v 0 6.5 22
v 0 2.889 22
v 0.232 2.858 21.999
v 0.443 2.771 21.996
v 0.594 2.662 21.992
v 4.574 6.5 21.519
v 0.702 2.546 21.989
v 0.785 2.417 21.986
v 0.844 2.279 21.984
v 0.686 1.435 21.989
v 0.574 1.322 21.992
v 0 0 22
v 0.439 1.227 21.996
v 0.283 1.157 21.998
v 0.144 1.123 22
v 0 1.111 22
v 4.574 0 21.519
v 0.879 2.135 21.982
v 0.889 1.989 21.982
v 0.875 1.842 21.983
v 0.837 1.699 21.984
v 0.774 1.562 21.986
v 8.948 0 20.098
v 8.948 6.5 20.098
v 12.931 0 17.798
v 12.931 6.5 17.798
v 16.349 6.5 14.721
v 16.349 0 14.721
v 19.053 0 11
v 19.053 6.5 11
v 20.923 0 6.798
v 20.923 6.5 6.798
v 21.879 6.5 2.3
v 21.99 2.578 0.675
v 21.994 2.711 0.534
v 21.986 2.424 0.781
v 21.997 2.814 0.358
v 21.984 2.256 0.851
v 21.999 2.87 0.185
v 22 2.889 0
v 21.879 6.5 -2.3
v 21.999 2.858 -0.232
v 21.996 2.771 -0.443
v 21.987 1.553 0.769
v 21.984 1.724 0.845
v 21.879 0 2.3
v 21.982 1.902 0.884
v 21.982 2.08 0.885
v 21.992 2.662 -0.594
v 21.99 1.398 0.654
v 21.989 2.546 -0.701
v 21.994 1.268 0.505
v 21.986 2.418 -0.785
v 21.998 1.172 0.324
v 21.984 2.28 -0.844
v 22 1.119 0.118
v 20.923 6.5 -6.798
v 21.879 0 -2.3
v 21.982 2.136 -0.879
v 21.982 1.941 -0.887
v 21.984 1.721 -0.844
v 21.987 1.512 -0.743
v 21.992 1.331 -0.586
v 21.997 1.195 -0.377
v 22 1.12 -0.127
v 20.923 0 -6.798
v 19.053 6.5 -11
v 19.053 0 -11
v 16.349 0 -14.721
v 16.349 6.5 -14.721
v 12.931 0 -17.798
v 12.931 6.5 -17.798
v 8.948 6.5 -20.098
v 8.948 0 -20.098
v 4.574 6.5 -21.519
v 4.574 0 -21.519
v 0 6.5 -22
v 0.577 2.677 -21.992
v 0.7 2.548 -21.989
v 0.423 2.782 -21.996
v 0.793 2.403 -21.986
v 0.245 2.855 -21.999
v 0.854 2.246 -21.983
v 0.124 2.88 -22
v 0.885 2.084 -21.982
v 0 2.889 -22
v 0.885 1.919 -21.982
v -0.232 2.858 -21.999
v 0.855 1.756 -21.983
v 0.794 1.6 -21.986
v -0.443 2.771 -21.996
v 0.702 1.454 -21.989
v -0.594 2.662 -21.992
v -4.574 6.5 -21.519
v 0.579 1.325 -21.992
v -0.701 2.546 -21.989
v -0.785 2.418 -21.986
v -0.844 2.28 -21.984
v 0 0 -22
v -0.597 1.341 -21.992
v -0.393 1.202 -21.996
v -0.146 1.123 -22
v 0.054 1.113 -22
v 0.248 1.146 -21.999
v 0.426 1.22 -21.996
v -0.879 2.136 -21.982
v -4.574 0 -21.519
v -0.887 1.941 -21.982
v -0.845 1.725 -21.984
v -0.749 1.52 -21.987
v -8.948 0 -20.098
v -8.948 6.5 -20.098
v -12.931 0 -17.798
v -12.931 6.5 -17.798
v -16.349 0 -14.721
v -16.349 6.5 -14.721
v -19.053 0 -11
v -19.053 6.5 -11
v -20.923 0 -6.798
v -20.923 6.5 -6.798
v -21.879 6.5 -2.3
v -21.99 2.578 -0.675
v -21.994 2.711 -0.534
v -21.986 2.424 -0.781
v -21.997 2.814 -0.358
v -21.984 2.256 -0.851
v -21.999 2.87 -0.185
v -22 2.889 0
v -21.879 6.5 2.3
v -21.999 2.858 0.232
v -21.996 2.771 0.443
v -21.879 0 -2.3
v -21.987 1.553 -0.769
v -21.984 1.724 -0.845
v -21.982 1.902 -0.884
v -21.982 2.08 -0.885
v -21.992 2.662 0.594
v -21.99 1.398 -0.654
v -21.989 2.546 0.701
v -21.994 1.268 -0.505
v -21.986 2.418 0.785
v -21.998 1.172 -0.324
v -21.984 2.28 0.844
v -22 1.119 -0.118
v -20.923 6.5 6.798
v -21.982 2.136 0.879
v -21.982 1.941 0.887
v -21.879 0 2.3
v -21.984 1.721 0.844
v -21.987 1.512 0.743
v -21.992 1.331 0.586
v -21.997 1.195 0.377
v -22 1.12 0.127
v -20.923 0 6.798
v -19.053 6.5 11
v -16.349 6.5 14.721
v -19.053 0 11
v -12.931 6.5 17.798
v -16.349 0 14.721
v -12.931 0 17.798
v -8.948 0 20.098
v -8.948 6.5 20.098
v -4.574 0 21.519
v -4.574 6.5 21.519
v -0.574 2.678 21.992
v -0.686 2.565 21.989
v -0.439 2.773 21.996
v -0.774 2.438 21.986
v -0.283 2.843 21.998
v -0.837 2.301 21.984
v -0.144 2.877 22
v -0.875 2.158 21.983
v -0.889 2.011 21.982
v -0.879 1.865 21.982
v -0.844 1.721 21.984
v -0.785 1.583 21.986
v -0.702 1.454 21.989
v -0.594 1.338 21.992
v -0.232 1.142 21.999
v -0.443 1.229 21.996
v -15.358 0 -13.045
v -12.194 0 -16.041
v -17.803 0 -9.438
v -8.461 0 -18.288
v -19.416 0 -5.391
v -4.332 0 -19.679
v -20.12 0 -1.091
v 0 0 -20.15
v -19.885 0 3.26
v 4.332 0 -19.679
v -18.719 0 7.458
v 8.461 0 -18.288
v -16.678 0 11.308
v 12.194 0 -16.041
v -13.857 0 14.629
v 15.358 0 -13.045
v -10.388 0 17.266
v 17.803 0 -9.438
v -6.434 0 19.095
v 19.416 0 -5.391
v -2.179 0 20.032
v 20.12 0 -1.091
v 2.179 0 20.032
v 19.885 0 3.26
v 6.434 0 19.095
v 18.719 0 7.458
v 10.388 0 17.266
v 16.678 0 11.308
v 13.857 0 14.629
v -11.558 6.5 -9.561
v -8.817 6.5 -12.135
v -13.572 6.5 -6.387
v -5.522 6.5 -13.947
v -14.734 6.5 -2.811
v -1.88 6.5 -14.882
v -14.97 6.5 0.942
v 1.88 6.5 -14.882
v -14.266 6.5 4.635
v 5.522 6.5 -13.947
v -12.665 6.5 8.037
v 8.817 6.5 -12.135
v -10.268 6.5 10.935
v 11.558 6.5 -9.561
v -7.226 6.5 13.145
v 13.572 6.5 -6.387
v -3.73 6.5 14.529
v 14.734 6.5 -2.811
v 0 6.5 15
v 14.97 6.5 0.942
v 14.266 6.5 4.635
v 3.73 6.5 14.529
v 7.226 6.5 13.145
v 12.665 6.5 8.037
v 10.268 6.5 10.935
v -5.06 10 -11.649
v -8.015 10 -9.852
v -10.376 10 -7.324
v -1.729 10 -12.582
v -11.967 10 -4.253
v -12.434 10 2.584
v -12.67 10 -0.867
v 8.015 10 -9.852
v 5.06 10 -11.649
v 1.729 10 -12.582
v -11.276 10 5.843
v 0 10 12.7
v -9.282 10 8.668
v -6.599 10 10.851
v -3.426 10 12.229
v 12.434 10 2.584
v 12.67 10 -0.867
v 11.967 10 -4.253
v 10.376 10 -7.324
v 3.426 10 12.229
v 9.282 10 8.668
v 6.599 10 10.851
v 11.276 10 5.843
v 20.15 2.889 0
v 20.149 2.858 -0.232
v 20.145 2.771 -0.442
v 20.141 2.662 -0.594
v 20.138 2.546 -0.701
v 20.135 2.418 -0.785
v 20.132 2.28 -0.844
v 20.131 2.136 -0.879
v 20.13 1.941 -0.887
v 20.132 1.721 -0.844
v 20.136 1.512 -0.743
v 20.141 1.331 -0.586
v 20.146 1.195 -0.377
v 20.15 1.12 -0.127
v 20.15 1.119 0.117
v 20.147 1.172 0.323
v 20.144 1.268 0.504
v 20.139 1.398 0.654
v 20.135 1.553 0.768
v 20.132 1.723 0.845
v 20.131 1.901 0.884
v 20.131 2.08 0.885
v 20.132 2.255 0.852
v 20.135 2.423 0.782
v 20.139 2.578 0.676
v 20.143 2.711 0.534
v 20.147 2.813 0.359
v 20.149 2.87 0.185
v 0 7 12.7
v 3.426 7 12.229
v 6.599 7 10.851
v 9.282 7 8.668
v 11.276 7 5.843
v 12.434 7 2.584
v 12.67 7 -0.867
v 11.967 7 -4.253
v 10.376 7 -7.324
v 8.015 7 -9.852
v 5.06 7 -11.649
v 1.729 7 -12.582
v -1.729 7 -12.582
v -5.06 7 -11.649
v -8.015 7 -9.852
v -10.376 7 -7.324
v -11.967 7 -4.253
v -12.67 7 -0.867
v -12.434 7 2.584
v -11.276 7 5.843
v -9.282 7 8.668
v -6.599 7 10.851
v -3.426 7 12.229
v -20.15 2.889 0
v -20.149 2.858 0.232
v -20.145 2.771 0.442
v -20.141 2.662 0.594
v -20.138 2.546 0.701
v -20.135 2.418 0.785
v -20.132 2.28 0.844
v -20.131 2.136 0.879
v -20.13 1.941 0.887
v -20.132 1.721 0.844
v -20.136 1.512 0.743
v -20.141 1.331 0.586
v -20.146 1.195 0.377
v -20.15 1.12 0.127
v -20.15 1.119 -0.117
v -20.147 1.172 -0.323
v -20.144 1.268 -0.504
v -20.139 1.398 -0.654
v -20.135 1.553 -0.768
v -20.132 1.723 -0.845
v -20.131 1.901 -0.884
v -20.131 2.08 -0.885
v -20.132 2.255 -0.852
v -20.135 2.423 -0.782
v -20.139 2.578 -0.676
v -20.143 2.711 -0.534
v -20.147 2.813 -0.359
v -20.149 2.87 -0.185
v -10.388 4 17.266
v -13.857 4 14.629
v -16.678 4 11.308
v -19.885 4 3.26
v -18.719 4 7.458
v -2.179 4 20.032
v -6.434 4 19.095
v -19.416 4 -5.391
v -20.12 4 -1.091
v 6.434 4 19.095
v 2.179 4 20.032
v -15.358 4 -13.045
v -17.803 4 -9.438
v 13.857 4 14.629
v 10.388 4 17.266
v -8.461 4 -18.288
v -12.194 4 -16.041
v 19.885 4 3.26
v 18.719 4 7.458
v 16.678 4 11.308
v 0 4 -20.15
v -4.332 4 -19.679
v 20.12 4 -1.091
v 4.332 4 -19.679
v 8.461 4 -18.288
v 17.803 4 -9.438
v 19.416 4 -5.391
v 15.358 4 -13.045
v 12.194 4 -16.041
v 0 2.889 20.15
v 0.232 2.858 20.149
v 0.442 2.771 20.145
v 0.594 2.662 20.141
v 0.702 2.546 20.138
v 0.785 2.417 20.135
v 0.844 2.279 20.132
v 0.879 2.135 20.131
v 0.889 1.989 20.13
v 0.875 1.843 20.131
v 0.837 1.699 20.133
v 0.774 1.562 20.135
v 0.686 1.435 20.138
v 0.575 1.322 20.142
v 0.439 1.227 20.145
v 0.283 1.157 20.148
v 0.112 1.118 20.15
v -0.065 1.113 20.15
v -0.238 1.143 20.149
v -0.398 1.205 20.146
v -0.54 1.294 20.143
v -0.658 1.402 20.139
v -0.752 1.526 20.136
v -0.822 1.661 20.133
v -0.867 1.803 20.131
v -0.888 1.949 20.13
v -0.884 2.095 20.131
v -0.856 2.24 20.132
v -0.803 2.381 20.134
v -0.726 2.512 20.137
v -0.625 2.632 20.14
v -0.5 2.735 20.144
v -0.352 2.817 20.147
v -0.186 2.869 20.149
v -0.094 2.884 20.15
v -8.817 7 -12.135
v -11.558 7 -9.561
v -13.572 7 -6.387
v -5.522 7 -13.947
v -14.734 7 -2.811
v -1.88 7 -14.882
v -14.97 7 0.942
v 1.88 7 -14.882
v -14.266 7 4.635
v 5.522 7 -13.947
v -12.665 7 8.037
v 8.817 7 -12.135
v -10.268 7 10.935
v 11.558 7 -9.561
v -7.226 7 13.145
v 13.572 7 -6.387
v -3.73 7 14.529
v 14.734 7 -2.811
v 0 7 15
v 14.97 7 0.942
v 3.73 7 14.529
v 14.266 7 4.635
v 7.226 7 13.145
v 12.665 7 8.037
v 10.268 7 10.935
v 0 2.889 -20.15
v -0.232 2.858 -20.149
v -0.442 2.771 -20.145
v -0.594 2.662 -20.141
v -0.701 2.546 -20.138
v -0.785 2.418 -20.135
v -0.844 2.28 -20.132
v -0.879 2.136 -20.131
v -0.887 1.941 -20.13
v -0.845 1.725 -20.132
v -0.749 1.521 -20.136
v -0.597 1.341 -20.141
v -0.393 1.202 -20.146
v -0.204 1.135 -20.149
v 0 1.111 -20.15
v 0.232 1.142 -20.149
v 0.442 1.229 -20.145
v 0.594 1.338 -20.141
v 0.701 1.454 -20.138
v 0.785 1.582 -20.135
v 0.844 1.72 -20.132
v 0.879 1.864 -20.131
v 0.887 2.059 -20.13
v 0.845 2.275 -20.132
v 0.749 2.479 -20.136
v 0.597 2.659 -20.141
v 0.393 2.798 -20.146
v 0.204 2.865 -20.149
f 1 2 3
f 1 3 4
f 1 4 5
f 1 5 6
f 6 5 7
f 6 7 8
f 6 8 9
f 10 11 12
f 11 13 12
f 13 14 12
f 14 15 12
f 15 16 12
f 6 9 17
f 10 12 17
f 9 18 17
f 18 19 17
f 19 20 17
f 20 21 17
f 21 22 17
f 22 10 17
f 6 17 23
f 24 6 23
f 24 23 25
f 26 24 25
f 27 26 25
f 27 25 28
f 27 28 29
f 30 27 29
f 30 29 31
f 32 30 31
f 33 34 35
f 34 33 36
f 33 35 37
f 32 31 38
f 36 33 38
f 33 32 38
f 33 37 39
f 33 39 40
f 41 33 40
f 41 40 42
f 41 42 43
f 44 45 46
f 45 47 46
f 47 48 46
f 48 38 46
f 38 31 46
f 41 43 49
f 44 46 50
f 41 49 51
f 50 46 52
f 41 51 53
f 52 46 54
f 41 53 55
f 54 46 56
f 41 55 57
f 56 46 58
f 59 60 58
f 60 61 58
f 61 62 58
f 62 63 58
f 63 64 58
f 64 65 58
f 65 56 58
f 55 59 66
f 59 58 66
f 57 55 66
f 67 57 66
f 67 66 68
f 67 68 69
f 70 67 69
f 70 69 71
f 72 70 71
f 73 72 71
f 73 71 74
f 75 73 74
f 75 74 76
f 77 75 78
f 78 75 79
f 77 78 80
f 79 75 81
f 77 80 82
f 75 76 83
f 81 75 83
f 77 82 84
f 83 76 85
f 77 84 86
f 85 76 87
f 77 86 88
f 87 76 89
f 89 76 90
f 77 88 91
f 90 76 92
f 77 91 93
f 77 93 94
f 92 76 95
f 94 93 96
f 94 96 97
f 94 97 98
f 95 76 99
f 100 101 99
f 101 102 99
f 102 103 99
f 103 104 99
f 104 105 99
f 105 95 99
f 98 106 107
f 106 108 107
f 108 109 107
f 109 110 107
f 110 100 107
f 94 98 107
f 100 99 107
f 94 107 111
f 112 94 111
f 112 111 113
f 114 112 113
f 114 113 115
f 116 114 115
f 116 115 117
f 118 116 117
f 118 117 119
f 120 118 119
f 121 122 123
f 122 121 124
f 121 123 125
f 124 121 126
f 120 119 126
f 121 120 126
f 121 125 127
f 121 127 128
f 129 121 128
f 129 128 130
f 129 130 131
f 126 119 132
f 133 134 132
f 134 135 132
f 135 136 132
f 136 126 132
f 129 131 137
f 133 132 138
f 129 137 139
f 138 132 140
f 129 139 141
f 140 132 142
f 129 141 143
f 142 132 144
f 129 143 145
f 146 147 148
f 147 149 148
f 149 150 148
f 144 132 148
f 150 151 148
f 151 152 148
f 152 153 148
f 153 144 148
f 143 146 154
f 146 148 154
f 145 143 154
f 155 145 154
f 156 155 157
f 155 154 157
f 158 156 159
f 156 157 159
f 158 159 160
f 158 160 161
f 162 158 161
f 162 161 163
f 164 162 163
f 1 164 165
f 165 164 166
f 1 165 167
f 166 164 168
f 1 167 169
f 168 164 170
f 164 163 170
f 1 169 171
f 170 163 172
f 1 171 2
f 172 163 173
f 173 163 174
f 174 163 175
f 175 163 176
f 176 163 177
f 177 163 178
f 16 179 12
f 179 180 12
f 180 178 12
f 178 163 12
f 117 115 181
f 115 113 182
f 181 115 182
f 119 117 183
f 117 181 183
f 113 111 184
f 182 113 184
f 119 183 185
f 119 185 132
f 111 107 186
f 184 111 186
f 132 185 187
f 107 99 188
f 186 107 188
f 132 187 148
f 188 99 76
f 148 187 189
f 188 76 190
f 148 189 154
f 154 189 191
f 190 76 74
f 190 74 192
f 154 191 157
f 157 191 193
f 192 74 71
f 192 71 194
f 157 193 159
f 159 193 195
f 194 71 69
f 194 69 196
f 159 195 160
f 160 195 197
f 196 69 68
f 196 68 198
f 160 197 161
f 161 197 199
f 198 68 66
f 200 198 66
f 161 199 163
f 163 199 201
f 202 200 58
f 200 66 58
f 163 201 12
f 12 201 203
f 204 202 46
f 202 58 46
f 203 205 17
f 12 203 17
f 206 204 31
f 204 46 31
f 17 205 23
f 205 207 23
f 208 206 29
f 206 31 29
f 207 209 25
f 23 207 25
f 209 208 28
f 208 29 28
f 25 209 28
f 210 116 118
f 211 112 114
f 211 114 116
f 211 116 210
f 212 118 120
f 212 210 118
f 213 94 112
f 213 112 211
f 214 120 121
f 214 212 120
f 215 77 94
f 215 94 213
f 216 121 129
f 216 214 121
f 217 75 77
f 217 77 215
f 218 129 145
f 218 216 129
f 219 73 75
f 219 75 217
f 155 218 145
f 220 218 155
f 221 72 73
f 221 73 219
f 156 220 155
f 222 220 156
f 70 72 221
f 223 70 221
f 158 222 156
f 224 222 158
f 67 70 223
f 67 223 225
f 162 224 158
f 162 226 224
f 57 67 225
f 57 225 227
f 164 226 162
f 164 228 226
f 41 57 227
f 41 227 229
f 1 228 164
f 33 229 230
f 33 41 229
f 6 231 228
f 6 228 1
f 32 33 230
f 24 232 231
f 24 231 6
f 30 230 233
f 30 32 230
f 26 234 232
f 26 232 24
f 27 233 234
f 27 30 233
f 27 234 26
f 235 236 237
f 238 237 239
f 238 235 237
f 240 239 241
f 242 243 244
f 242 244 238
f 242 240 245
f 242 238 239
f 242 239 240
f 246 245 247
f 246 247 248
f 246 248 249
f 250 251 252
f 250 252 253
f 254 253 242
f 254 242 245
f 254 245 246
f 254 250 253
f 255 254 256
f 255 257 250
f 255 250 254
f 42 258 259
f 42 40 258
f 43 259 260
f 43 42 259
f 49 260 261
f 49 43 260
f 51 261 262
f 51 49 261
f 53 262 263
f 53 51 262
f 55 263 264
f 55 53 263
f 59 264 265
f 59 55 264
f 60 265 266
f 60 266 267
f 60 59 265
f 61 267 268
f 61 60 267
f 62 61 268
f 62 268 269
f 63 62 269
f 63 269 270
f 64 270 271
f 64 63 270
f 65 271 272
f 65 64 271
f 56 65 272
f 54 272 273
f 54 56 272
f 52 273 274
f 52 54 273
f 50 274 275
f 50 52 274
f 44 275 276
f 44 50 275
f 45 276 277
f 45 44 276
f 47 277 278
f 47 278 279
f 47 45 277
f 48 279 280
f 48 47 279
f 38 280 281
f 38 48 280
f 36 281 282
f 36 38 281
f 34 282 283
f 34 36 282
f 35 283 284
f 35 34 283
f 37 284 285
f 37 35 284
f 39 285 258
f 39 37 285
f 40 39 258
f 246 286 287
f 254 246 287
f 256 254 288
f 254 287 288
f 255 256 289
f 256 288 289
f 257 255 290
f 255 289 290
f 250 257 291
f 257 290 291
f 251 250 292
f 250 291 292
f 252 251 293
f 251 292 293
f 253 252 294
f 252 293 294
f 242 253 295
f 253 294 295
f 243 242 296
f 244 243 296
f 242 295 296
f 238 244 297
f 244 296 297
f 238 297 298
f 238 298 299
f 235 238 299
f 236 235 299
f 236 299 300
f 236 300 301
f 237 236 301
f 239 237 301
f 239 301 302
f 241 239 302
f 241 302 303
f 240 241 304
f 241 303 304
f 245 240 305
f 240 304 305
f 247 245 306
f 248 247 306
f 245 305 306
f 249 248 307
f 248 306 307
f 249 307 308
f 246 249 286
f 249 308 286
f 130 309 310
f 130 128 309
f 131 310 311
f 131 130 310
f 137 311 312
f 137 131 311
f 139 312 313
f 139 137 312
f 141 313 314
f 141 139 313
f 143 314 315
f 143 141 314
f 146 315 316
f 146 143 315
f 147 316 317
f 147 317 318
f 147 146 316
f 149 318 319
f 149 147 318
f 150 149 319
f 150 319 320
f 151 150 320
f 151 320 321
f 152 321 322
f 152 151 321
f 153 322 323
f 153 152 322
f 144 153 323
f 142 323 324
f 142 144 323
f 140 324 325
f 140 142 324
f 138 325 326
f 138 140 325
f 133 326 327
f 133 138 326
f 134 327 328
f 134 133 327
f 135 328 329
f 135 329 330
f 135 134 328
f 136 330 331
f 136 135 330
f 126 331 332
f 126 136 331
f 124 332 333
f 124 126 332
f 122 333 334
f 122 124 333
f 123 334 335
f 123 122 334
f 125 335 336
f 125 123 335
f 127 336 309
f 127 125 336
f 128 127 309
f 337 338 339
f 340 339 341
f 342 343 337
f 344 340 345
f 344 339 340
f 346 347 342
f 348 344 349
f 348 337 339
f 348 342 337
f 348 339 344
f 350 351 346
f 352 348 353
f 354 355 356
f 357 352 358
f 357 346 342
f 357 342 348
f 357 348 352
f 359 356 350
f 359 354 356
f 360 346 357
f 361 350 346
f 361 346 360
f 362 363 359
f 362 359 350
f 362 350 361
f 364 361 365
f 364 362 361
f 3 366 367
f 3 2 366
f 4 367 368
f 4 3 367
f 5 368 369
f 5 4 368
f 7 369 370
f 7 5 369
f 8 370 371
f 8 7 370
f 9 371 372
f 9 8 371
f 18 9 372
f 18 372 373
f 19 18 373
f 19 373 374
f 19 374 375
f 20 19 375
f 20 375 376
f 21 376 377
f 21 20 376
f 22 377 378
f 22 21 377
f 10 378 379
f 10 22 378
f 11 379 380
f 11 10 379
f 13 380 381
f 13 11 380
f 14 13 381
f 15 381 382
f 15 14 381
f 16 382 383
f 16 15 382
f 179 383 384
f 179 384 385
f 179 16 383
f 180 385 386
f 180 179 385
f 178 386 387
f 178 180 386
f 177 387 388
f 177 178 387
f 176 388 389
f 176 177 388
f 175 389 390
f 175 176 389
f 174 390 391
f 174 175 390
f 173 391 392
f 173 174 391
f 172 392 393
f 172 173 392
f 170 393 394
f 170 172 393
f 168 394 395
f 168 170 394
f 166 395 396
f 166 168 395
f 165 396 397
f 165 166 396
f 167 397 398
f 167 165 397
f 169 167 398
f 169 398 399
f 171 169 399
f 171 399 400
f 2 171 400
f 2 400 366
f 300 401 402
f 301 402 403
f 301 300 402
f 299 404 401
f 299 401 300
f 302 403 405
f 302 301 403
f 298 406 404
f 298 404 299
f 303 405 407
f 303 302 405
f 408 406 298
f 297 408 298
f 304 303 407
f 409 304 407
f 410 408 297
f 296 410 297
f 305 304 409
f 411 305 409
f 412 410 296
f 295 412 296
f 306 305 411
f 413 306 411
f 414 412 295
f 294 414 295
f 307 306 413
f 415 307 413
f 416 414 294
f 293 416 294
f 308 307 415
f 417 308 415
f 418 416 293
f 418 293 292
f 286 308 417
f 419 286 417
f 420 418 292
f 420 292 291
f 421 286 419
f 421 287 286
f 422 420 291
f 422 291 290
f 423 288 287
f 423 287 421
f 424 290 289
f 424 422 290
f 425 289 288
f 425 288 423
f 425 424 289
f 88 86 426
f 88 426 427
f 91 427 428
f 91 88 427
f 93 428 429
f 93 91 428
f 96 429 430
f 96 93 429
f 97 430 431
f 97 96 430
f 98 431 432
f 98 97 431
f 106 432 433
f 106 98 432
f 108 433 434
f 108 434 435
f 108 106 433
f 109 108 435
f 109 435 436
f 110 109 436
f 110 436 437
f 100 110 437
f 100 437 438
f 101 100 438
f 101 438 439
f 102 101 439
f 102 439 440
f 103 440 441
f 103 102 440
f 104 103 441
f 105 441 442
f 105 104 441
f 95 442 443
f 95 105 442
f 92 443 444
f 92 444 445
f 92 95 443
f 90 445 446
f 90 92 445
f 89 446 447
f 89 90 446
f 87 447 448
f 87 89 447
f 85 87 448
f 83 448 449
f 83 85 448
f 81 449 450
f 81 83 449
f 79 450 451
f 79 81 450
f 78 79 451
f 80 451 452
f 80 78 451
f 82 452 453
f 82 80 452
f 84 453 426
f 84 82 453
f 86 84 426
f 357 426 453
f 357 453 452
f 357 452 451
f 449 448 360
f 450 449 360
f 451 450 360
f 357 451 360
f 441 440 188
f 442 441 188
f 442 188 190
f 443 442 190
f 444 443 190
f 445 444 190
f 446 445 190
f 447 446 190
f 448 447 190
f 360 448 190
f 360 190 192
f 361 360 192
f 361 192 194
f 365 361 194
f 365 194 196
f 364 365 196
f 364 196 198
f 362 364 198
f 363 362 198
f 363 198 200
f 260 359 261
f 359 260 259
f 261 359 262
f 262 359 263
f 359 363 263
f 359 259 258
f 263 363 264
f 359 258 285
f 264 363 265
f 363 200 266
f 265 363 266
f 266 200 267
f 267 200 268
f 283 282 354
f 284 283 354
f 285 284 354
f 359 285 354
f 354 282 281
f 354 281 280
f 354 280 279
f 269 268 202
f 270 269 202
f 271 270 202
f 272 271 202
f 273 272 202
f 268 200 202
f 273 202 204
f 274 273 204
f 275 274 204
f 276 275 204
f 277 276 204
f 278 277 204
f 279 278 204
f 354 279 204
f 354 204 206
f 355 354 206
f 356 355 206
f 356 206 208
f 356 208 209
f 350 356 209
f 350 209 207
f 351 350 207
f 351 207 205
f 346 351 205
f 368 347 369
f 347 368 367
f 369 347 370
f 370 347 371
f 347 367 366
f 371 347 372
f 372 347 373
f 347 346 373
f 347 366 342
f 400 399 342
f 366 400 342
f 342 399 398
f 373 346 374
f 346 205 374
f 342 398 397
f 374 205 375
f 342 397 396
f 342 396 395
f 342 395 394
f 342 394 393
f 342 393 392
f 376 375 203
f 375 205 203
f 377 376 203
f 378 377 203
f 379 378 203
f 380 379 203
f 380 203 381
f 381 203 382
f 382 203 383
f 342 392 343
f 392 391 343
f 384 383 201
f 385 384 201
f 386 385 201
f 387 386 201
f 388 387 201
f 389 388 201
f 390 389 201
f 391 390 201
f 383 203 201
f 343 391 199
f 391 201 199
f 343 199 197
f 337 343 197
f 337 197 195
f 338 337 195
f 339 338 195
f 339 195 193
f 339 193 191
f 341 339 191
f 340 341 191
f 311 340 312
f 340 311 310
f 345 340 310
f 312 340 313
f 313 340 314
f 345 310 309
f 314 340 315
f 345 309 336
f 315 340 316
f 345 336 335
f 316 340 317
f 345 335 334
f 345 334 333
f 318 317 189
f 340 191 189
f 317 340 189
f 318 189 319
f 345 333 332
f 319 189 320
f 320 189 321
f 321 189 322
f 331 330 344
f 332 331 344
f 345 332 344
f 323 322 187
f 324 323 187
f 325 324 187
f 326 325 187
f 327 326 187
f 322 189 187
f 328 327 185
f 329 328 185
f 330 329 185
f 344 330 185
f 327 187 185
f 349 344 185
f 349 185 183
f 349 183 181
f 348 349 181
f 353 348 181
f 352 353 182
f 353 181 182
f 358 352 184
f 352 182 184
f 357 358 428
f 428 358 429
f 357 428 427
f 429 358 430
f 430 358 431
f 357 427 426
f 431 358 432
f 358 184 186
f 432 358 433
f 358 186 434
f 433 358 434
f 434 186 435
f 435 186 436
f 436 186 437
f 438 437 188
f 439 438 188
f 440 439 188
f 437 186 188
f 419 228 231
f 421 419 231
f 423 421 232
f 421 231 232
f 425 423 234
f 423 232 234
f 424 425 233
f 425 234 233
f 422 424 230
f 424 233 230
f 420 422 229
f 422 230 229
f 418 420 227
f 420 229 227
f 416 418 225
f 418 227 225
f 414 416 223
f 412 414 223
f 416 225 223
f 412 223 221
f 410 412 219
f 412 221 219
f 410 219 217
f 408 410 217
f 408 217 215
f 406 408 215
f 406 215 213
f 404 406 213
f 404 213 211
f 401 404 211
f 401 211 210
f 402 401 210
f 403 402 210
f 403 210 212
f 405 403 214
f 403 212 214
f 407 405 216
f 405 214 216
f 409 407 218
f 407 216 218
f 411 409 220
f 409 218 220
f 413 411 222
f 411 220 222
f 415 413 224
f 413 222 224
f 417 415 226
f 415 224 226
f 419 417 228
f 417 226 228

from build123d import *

# Parameters (mm, degrees)
SKETCH_2_R               = 22
EXTRUDE_1_DEPTH          = 10
SKETCH_3_R               = 20
CUT_EXTRUDE_1_DEPTH      = 4
CUT_EXTRUDE_START        = -3
SKETCH_4_R               = 22
SKETCH_4_R_2             = 12.7
CUT_EXTRUDE_2_DEPTH      = 3
SKETCH_9_R               = 20.15
CUT_EXTRUDE_3_DEPTH      = 4
CUT_EXTRUDE_START_2      = -0.5
SKETCH_10_R              = 22
SKETCH_10_R_2            = 15
CUT_EXTRUDE_4_DEPTH      = 0.5
PATTERN_CIRCULAR_1_COUNT = 4


with BuildPart() as part:
    # 草图2 → 凸台-拉伸1 (new body)
    with BuildSketch(Plane(origin=(0, 0, 0), x_dir=(1, 0, 0), z_dir=(0, 1, 0))):
        with Locations(Location((0, 0, 0), (0, 0, 270))):
            Circle(SKETCH_2_R)
    extrude(amount=EXTRUDE_1_DEPTH)

    # 草图3 → 切除-拉伸1 (cut)
    with BuildSketch(Plane.XZ):
        with Locations(Location((0, 0, 0), (0, 0, 270))):
            Circle(SKETCH_3_R)
    extrude(amount=-CUT_EXTRUDE_1_DEPTH, mode=Mode.SUBTRACT)

    # 草图4 → 切除-拉伸2 (cut)
    with BuildSketch(Plane(origin=(0, 10, 0), x_dir=(1, 0, 0), z_dir=(0, 1, 0)).offset(CUT_EXTRUDE_START)):
        with Locations(Location((0, 0, 0), (0, 0, 270))):
            Circle(SKETCH_4_R)
        with Locations(Location((0, 0, 0), (0, 0, 270))):
            Circle(SKETCH_4_R_2, mode=Mode.SUBTRACT)
    extrude(amount=CUT_EXTRUDE_2_DEPTH, mode=Mode.SUBTRACT)

    # 草图9 → 切除-拉伸3 (cut)
    with BuildSketch(Plane.XZ):
        with Locations(Location((0, 0, 0), (0, 0, 270))):
            Circle(SKETCH_9_R)
    extrude(amount=-CUT_EXTRUDE_3_DEPTH, mode=Mode.SUBTRACT)

    # 草图10 → 切除-拉伸4 (cut)
    with BuildSketch(Plane(origin=(0, 7, 0), x_dir=(1, 0, 0), z_dir=(0, 1, 0)).offset(CUT_EXTRUDE_START_2)):
        with Locations(Location((0, 0, 0), (0, 0, 270))):
            Circle(SKETCH_10_R)
        with Locations(Location((0, 0, 0), (0, 0, 270))):
            Circle(SKETCH_10_R_2, mode=Mode.SUBTRACT)
    extrude(amount=CUT_EXTRUDE_4_DEPTH, mode=Mode.SUBTRACT)

    # 草图7 → #2-56 螺纹孔1 (revolve, cut)
    with BuildSketch(Plane(origin=(0, 2, -22), x_dir=(0, 1, 0), z_dir=(1, 0, 0))):
        Polygon((0, 0), (0, 5.53416509), (0.889, 5), (0.889, 0), align=None)
    hole_wizard_2_56_1 = revolve(axis=Axis((0, 2, -28.35), (0, 0, 1)), mode=Mode.SUBTRACT)

    # 阵列(圆周)1: #2-56 螺纹孔1 ×4 about axis
    pattern_circular_1_axis = Axis((0, 0, 0), (0, 1, 0))
    for i in range(1, PATTERN_CIRCULAR_1_COUNT):
        add(hole_wizard_2_56_1.rotate(pattern_circular_1_axis, i * 360 / PATTERN_CIRCULAR_1_COUNT), mode=Mode.SUBTRACT)


solid = part.part
